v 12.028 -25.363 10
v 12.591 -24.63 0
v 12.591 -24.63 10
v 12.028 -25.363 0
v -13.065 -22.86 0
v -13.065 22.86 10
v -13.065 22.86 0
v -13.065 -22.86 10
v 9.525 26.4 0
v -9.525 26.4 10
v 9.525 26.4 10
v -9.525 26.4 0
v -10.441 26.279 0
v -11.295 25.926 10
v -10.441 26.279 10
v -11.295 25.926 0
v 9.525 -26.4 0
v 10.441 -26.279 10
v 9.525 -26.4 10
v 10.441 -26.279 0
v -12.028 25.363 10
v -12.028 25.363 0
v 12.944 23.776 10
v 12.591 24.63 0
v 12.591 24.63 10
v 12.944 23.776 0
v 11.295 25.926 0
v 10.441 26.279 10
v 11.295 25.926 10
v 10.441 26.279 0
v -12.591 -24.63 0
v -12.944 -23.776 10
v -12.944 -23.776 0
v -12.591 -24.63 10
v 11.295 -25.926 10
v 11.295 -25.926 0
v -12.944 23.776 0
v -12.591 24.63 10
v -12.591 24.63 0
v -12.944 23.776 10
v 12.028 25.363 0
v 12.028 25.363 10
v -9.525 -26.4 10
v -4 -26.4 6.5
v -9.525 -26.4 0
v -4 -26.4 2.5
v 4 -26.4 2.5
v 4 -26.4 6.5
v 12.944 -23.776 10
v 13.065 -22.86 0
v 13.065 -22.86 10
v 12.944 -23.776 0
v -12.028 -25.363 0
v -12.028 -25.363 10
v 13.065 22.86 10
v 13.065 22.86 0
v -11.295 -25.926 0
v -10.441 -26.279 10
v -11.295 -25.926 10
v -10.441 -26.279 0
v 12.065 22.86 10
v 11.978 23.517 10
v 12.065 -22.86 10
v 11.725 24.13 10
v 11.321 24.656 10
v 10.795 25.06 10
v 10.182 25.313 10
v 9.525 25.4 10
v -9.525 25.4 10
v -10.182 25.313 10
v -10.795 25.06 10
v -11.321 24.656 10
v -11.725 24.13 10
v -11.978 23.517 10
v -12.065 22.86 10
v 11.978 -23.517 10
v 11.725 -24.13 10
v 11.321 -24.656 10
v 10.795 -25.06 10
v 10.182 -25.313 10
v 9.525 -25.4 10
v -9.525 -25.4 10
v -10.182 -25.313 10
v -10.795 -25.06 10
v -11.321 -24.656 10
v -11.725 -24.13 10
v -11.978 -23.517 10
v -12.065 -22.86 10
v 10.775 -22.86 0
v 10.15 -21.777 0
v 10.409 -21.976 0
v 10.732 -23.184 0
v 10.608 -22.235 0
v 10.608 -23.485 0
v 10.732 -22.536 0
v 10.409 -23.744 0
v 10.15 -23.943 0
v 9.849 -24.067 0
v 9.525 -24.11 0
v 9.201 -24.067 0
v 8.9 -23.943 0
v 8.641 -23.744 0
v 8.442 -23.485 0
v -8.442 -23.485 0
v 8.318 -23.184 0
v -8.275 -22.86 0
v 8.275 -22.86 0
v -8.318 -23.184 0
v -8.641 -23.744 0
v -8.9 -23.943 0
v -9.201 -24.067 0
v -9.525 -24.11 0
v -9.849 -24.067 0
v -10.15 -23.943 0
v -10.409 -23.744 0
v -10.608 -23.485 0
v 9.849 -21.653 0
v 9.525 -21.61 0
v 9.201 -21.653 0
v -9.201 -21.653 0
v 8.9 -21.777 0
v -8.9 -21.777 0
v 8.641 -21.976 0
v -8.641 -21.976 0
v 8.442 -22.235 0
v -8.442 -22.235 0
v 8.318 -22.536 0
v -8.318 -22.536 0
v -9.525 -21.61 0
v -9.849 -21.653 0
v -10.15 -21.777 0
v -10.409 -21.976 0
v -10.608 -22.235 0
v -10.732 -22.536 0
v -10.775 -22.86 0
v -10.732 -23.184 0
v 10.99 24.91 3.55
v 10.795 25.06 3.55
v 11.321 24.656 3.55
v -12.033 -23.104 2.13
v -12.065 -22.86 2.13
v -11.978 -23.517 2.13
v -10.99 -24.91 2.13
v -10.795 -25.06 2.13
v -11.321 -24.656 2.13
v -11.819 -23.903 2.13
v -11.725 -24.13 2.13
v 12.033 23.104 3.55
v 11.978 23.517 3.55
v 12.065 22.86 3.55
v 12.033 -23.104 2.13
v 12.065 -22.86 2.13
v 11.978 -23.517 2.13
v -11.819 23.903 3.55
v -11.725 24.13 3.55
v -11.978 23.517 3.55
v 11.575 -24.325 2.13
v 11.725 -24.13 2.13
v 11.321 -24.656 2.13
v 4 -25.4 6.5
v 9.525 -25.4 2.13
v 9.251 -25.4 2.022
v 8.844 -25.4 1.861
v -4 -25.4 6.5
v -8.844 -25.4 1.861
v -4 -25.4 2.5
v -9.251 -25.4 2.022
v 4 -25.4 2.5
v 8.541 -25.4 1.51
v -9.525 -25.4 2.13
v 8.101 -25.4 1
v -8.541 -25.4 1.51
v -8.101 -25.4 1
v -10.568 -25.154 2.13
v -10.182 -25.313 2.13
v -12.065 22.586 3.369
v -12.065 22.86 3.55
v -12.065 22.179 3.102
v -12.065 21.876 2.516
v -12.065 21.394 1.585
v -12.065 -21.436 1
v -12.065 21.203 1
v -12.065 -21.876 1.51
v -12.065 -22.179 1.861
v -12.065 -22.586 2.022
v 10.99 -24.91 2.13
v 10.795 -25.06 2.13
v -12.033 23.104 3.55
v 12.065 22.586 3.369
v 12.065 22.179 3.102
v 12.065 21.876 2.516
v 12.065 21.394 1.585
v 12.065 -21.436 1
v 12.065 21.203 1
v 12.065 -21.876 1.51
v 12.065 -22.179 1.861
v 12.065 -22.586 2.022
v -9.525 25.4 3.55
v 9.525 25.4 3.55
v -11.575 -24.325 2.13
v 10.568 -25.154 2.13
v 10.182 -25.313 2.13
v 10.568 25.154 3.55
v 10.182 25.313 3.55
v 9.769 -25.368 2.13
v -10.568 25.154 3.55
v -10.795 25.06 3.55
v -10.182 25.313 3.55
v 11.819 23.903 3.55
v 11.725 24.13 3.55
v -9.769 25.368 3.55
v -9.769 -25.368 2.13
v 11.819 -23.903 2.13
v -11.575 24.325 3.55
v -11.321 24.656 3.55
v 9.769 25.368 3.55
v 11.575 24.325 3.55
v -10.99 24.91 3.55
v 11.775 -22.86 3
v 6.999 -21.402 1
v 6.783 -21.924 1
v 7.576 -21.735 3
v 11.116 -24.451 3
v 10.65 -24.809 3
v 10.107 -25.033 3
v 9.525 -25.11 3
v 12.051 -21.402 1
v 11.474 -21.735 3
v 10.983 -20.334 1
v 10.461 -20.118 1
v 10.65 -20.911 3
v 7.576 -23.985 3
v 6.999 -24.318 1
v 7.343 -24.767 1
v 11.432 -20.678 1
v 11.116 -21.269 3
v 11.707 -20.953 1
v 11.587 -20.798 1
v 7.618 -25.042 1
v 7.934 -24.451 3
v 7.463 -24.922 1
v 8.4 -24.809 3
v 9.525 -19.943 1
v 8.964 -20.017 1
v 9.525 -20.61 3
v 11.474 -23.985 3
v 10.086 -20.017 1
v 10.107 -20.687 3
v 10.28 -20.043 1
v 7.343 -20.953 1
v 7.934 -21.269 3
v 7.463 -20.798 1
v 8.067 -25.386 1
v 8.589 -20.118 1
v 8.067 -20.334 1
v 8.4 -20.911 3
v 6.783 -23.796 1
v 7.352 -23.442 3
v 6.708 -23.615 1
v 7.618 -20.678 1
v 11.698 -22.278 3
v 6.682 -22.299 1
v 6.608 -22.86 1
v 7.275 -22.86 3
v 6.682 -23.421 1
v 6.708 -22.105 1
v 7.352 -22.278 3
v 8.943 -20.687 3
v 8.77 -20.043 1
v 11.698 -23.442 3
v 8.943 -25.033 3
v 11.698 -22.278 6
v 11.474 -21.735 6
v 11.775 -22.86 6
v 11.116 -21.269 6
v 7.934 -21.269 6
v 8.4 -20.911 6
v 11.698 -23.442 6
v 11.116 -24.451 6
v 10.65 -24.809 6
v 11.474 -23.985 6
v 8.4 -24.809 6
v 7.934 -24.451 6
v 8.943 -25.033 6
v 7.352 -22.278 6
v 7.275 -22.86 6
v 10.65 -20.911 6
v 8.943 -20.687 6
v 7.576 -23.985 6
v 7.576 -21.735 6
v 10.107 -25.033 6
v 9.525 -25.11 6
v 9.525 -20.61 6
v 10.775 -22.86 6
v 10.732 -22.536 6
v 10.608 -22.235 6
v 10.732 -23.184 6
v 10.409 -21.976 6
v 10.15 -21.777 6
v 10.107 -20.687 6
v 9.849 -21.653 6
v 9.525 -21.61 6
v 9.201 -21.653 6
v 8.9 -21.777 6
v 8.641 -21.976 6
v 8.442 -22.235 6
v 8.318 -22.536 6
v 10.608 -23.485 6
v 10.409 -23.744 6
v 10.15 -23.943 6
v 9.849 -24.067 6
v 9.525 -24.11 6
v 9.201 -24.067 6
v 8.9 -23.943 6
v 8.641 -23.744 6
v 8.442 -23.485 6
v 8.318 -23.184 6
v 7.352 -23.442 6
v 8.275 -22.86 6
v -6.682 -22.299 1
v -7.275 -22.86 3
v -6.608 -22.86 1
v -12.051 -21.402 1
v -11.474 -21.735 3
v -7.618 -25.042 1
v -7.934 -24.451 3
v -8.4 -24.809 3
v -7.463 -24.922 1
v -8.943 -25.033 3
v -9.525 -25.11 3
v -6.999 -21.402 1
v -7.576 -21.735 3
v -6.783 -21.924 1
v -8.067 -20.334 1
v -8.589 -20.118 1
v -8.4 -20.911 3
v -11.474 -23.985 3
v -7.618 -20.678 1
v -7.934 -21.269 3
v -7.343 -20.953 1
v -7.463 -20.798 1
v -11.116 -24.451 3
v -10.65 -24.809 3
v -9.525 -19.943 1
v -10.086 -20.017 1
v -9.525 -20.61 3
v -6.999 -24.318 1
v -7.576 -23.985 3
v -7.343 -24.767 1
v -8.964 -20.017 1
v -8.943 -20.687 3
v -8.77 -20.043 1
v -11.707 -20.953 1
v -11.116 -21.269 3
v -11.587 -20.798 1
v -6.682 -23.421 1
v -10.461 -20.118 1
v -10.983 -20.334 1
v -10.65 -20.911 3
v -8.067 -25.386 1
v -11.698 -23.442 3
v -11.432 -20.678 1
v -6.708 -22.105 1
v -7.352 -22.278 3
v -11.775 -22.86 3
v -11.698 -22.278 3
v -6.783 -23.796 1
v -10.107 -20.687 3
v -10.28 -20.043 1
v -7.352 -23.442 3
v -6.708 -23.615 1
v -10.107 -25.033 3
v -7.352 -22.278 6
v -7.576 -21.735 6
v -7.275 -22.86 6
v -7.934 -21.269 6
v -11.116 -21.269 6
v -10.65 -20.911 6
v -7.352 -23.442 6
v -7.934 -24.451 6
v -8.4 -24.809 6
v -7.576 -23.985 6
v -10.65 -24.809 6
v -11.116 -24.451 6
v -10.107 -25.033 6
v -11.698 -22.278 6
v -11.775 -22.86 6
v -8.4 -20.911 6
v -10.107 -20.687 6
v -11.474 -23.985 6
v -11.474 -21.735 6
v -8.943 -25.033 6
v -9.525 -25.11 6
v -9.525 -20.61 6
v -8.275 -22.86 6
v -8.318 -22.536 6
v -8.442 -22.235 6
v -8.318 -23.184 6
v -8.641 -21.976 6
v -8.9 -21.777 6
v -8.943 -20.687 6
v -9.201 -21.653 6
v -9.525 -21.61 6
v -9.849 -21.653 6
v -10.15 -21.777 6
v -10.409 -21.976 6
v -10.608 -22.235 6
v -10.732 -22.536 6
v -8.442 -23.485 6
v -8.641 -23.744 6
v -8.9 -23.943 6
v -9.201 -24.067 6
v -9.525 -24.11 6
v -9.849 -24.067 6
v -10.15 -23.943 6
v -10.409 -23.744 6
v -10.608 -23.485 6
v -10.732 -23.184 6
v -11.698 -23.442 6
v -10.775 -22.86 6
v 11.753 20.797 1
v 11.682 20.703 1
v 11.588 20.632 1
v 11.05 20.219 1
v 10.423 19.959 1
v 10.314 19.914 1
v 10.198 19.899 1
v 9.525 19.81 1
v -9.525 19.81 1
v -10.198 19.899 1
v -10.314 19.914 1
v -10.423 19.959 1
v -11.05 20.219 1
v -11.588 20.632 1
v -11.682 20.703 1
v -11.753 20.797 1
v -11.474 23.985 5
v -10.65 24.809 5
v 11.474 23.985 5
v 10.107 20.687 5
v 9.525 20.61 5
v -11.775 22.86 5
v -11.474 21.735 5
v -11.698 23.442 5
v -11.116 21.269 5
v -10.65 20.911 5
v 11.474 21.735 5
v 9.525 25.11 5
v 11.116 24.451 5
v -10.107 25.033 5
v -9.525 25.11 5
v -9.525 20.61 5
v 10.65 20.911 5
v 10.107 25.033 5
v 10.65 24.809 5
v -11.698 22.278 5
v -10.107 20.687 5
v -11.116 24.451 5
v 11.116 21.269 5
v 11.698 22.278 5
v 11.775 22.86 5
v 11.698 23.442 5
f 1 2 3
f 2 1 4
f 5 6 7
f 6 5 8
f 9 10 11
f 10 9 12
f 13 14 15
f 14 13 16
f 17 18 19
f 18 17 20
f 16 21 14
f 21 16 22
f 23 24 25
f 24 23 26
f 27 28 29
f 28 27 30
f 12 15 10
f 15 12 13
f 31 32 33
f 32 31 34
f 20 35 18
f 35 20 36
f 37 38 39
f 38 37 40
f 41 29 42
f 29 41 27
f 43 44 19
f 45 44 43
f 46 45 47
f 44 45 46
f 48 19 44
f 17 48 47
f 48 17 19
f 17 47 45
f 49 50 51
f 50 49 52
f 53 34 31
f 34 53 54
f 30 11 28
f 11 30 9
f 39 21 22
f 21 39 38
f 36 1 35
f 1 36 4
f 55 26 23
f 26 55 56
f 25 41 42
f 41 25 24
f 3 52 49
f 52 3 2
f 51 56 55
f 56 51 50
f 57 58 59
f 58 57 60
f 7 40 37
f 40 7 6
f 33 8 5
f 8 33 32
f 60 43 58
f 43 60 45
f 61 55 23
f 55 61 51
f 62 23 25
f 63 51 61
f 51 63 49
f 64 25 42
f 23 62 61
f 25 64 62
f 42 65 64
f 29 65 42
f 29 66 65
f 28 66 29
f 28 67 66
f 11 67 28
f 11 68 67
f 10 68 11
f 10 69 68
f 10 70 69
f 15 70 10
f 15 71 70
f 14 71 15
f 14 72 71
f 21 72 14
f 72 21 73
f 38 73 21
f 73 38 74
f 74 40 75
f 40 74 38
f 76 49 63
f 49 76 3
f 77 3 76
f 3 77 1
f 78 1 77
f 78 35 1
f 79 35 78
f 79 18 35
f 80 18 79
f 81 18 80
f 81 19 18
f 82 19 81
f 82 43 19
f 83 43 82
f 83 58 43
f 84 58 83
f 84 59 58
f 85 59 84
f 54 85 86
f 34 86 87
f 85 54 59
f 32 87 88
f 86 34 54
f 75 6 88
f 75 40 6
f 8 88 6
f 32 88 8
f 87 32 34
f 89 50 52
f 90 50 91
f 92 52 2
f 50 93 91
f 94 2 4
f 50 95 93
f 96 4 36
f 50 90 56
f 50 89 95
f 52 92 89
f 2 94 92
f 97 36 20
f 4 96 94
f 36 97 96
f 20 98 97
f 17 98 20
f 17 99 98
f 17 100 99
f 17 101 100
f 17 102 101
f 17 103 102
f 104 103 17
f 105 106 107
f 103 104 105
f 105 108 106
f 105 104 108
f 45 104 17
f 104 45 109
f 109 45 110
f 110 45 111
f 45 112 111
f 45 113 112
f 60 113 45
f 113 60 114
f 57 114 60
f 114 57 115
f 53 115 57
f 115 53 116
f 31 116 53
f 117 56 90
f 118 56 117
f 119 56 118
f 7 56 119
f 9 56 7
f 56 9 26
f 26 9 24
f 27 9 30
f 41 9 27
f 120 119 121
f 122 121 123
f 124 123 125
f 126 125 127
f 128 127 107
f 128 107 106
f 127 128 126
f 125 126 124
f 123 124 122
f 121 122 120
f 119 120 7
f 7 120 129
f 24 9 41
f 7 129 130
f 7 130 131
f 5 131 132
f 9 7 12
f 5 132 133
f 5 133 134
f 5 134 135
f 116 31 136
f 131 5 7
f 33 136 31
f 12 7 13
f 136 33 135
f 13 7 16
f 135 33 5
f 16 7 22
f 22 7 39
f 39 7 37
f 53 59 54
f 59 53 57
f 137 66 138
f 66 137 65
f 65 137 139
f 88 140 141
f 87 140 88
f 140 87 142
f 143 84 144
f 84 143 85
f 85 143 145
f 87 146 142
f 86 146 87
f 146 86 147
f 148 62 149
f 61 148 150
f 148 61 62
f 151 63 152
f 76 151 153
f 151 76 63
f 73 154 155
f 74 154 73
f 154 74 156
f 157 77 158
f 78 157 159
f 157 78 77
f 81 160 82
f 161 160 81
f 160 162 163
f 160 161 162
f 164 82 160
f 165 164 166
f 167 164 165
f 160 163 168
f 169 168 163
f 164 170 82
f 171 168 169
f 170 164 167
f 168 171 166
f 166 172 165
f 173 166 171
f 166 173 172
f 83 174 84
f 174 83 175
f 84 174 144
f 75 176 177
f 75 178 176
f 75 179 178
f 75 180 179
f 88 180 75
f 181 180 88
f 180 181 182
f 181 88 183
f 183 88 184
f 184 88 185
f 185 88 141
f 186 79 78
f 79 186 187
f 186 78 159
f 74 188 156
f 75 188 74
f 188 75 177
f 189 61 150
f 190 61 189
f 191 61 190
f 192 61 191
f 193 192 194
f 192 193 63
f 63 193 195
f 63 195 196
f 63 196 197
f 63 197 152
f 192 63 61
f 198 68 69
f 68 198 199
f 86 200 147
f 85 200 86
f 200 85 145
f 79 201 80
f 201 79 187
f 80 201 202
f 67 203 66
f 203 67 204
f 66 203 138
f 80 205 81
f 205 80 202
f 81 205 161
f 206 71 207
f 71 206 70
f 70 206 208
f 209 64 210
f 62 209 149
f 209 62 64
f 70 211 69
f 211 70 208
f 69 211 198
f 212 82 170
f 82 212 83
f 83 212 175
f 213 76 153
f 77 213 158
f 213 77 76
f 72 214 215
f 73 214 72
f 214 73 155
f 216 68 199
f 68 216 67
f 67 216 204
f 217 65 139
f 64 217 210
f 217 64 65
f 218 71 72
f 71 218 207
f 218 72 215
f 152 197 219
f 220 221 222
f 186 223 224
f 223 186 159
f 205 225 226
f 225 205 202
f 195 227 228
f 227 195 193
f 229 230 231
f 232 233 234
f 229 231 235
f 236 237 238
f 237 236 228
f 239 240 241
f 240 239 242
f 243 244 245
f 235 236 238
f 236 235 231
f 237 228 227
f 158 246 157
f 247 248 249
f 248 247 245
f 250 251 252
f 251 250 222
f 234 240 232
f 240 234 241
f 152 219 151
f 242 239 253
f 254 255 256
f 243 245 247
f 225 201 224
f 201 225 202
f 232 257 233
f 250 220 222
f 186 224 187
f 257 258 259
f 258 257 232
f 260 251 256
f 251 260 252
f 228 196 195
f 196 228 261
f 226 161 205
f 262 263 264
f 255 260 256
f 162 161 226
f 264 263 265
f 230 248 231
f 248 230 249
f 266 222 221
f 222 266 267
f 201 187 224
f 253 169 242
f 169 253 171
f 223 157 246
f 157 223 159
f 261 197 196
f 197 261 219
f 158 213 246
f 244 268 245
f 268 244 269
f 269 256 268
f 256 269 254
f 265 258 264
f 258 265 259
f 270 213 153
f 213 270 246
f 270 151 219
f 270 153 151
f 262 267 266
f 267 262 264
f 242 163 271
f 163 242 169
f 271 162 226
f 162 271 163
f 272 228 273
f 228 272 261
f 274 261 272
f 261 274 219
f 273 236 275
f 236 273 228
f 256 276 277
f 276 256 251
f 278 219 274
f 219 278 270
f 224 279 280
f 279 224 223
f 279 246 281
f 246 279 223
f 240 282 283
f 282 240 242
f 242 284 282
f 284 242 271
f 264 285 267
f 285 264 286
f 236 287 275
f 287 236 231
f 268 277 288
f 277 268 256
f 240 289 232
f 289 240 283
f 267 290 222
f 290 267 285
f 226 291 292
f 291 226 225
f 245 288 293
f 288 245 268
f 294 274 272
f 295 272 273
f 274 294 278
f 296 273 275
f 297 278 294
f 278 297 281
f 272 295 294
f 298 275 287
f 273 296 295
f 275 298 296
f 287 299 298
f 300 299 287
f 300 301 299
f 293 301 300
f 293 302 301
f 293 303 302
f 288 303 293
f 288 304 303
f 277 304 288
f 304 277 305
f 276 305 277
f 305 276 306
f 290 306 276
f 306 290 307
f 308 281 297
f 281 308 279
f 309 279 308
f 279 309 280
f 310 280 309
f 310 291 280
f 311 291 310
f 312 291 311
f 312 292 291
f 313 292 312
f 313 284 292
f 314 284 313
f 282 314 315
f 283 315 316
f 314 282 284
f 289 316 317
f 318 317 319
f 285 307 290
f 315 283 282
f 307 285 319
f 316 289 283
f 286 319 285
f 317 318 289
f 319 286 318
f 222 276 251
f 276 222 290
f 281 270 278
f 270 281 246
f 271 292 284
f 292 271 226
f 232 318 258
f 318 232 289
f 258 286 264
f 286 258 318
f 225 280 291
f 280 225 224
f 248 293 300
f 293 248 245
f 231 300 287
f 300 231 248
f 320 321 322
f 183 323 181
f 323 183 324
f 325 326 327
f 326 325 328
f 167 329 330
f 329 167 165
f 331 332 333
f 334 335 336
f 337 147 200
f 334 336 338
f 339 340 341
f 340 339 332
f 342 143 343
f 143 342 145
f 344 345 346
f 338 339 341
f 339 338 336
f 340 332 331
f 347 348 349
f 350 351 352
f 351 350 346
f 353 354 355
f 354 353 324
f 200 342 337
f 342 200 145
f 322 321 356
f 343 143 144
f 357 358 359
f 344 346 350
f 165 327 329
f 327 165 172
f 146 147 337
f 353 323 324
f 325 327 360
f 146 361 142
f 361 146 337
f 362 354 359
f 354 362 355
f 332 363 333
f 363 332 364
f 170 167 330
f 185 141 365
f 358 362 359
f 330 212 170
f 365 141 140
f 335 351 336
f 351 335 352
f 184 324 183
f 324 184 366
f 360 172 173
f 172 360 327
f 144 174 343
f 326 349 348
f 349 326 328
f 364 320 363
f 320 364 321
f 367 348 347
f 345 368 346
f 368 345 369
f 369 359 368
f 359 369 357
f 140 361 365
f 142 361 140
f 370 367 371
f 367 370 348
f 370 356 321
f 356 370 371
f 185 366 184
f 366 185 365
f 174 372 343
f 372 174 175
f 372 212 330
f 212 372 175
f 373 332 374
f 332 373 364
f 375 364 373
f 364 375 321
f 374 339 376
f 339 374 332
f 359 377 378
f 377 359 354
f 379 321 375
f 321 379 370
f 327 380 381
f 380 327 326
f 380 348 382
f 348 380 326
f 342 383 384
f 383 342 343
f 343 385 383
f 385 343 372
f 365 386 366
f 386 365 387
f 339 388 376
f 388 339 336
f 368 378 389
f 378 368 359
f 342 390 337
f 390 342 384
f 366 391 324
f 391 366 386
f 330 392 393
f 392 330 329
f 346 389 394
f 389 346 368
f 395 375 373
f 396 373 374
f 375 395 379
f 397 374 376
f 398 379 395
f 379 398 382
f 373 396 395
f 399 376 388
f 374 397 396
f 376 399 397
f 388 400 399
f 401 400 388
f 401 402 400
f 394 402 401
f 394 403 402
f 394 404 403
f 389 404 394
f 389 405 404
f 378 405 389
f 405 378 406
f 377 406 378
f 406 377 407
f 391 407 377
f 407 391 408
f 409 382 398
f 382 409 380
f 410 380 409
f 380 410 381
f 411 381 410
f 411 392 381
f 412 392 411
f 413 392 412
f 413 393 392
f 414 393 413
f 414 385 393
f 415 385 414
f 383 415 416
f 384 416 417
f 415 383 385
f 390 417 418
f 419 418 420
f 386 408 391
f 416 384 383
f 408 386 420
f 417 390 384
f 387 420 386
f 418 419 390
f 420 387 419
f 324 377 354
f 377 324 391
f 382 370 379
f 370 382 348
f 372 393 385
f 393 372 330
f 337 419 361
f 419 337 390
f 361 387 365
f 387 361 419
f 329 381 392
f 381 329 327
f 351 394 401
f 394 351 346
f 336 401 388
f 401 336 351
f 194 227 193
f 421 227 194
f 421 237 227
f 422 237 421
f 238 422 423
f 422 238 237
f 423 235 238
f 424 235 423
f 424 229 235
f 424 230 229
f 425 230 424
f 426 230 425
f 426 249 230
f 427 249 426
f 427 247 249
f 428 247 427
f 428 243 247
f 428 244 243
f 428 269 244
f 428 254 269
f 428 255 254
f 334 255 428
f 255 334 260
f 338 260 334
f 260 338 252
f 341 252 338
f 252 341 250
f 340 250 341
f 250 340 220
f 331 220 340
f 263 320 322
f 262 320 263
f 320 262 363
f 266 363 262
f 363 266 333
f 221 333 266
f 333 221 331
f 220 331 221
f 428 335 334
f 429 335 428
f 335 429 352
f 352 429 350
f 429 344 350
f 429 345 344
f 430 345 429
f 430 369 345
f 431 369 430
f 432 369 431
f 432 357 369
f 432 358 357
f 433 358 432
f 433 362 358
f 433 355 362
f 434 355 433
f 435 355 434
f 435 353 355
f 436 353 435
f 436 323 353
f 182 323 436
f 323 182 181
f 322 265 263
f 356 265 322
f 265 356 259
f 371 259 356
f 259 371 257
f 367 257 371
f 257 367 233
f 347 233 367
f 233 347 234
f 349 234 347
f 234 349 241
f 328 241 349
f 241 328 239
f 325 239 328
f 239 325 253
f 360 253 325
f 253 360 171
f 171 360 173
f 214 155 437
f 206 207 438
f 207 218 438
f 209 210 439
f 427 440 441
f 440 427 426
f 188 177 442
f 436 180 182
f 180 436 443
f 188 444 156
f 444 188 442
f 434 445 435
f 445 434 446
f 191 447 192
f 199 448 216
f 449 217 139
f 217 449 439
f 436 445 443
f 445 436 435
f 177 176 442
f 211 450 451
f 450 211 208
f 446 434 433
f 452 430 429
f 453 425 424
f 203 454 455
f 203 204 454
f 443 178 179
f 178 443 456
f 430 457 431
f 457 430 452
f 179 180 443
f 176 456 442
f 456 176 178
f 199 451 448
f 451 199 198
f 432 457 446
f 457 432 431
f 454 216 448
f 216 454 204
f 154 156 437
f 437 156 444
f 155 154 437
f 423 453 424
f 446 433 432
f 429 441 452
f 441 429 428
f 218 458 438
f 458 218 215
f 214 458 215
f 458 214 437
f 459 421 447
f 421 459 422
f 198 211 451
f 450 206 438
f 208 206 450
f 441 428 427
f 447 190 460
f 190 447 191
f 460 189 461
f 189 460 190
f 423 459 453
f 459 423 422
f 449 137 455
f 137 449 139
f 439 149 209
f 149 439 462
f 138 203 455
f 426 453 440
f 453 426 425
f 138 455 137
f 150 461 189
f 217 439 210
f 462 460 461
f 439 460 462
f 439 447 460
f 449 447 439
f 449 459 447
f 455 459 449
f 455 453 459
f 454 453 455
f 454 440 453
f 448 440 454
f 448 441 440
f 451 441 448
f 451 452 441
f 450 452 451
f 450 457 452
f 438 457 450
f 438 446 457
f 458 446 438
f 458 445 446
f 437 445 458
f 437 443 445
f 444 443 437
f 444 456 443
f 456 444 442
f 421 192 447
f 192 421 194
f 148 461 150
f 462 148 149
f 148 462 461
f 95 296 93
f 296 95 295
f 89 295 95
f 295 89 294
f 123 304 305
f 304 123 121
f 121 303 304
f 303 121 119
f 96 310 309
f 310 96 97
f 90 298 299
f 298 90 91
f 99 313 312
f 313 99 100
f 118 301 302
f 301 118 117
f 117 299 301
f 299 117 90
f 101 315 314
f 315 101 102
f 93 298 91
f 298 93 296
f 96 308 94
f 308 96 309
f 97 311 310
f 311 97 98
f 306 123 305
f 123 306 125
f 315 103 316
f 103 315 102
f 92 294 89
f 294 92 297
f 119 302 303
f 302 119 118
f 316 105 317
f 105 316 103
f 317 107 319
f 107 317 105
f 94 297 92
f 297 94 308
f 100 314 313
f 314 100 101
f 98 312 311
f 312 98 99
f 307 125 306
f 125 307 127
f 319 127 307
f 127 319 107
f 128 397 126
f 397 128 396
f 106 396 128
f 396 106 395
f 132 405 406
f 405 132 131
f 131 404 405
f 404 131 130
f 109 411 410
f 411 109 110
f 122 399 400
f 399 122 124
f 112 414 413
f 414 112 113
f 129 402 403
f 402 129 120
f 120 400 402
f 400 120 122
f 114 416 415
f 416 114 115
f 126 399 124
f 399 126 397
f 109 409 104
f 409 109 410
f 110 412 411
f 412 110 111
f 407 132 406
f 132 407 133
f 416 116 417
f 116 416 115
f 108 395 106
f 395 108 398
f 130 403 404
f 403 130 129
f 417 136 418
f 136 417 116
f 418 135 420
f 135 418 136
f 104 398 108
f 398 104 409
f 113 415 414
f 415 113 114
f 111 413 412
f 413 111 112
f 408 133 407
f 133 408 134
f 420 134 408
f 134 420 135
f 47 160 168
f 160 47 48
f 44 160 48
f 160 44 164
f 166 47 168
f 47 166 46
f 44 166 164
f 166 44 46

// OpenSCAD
// file: hull.scad
// copied from https://gist.github.com/hexagon5un/73e187dfa0404c69177795424f397ce6

module multiHull(){
	for (i = [1 : $children-1])
		hull(){
			children(0);
			children(i);
		}
}

module sequentialHull(){
	for (i = [0: $children-2])
		hull(){
			children(i);
			children(i+1);
		}
}

/* Extended fun hull functions */ 

module cylinders(points, diameter, thickness){
	for (p=points){
		translate(p) cylinder(d=diameter, h=thickness, center=true);
	}
}

module plate(points, diameter, thickness, hole_diameter){
	difference(){
		hull() cylinders(points, diameter, thickness);
		cylinders(points, hole_diameter, 1000);
	}
}

module bar(length, width, thickness, hole_diameter){
	plate([[0,0,0], [length,0,0]], width, thickness, hole_diameter);
}

module rounded_box(points, radius, height){
	hull(){
		for (p = points){
			translate(p)
				cylinder(r=radius, h=height);
		}
	}
}

module point_cloud(points, radius=1, facets=8){
	for (p=points){
		translate(p)
			sphere(radius/cos(180/facets), $fn=facets);
		// polygon sphere circumscribed on radius
	}
}

module point_hull(points, radius=1, facets=8){
	hull(){
		point_cloud(points, radius, facets);
	}
}

// Shrink the exterior of the points so that the hull fits inside
function select(vector, i) = [ for (p=vector) p[i] ];
function axis_center(v, i) = (max(select(v, i)) - min(select(v,i)))/2;
function center(v) = [ for (i = [0,1,2]) axis_center(v, i) ];
function shrink_point(point, center, radius) = [ for (i = [0,1,2]) point[i] > center[i] ? point[i] - radius : point[i] + radius ]; 
function shrink(points, radius) = [ for (p = points) shrink_point(p, center(points), radius) ];

module interior_point_hull(points, radius=1){
	point_hull(shrink(points, radius), radius);
}

module interior_rounded_box(points, radius, height){
	rounded_box(shrink(points, radius), radius, height);
}


module mirror_copy(v = [1, 0, 0]) {
    children();
    mirror(v) children();
}
// main file
use <hull.scad>

// originally copied from https://gist.github.com/hexagon5un/0b119627e736658db186de3212fdad5f

// 50mm
// 23mm
// 19mm

w = 19.05;
l = 45.72;
pin_locations = [
  [ w/2, -l/2, 0],
  [-w/2, -l/2, 0],
  [-w/2, l/2, 0], 
  [ w/2, l/2, 0]
];
pin_height = 6;
edge_from_pins = 2.54;
thickness = 1;
$fn = 24;

module place(i){
	translate(pin_locations[i])
		children(0);
}

module foot(){
	cylinder(d=2 * edge_from_pins, h=thickness);
}

module standoff(height = pin_height){
	cylinder(d1=6.5, d2=4.5, h=3);
	cylinder(d=4.5, h=height);
}

module stand() {
  hull() {
    for (i=[2:3]){
      place(i) standoff(height = pin_height - 1);
    }
  }
}

module bottom(){
	hull(){
		place(0) foot();
		place(1) foot();
		place(2) foot();
		place(3) foot();
	}
}


module bumper(){
	difference(){
		rounded_box(pin_locations, radius=1 + edge_from_pins, height=10);
		translate([0,0,-1])
			rounded_box(pin_locations, radius=edge_from_pins, height=12);
	}
}

module PCB_case(){
	difference(){ 
		// frame
		union(){
      bottom();
			bumper();
			
      for (i=[0:1]){
        place(i) standoff();
      }

      stand();
		}
		// difference screw holes
		for (i=[0:1]){
			place(i) cylinder(d=2.5, h=100, center=true);
		}
    // difference usb
    translate([-4, -l, pin_height - 3.5])
    cube(
      [8, l, 4]
    ); 
	}
}

PCB_case();
